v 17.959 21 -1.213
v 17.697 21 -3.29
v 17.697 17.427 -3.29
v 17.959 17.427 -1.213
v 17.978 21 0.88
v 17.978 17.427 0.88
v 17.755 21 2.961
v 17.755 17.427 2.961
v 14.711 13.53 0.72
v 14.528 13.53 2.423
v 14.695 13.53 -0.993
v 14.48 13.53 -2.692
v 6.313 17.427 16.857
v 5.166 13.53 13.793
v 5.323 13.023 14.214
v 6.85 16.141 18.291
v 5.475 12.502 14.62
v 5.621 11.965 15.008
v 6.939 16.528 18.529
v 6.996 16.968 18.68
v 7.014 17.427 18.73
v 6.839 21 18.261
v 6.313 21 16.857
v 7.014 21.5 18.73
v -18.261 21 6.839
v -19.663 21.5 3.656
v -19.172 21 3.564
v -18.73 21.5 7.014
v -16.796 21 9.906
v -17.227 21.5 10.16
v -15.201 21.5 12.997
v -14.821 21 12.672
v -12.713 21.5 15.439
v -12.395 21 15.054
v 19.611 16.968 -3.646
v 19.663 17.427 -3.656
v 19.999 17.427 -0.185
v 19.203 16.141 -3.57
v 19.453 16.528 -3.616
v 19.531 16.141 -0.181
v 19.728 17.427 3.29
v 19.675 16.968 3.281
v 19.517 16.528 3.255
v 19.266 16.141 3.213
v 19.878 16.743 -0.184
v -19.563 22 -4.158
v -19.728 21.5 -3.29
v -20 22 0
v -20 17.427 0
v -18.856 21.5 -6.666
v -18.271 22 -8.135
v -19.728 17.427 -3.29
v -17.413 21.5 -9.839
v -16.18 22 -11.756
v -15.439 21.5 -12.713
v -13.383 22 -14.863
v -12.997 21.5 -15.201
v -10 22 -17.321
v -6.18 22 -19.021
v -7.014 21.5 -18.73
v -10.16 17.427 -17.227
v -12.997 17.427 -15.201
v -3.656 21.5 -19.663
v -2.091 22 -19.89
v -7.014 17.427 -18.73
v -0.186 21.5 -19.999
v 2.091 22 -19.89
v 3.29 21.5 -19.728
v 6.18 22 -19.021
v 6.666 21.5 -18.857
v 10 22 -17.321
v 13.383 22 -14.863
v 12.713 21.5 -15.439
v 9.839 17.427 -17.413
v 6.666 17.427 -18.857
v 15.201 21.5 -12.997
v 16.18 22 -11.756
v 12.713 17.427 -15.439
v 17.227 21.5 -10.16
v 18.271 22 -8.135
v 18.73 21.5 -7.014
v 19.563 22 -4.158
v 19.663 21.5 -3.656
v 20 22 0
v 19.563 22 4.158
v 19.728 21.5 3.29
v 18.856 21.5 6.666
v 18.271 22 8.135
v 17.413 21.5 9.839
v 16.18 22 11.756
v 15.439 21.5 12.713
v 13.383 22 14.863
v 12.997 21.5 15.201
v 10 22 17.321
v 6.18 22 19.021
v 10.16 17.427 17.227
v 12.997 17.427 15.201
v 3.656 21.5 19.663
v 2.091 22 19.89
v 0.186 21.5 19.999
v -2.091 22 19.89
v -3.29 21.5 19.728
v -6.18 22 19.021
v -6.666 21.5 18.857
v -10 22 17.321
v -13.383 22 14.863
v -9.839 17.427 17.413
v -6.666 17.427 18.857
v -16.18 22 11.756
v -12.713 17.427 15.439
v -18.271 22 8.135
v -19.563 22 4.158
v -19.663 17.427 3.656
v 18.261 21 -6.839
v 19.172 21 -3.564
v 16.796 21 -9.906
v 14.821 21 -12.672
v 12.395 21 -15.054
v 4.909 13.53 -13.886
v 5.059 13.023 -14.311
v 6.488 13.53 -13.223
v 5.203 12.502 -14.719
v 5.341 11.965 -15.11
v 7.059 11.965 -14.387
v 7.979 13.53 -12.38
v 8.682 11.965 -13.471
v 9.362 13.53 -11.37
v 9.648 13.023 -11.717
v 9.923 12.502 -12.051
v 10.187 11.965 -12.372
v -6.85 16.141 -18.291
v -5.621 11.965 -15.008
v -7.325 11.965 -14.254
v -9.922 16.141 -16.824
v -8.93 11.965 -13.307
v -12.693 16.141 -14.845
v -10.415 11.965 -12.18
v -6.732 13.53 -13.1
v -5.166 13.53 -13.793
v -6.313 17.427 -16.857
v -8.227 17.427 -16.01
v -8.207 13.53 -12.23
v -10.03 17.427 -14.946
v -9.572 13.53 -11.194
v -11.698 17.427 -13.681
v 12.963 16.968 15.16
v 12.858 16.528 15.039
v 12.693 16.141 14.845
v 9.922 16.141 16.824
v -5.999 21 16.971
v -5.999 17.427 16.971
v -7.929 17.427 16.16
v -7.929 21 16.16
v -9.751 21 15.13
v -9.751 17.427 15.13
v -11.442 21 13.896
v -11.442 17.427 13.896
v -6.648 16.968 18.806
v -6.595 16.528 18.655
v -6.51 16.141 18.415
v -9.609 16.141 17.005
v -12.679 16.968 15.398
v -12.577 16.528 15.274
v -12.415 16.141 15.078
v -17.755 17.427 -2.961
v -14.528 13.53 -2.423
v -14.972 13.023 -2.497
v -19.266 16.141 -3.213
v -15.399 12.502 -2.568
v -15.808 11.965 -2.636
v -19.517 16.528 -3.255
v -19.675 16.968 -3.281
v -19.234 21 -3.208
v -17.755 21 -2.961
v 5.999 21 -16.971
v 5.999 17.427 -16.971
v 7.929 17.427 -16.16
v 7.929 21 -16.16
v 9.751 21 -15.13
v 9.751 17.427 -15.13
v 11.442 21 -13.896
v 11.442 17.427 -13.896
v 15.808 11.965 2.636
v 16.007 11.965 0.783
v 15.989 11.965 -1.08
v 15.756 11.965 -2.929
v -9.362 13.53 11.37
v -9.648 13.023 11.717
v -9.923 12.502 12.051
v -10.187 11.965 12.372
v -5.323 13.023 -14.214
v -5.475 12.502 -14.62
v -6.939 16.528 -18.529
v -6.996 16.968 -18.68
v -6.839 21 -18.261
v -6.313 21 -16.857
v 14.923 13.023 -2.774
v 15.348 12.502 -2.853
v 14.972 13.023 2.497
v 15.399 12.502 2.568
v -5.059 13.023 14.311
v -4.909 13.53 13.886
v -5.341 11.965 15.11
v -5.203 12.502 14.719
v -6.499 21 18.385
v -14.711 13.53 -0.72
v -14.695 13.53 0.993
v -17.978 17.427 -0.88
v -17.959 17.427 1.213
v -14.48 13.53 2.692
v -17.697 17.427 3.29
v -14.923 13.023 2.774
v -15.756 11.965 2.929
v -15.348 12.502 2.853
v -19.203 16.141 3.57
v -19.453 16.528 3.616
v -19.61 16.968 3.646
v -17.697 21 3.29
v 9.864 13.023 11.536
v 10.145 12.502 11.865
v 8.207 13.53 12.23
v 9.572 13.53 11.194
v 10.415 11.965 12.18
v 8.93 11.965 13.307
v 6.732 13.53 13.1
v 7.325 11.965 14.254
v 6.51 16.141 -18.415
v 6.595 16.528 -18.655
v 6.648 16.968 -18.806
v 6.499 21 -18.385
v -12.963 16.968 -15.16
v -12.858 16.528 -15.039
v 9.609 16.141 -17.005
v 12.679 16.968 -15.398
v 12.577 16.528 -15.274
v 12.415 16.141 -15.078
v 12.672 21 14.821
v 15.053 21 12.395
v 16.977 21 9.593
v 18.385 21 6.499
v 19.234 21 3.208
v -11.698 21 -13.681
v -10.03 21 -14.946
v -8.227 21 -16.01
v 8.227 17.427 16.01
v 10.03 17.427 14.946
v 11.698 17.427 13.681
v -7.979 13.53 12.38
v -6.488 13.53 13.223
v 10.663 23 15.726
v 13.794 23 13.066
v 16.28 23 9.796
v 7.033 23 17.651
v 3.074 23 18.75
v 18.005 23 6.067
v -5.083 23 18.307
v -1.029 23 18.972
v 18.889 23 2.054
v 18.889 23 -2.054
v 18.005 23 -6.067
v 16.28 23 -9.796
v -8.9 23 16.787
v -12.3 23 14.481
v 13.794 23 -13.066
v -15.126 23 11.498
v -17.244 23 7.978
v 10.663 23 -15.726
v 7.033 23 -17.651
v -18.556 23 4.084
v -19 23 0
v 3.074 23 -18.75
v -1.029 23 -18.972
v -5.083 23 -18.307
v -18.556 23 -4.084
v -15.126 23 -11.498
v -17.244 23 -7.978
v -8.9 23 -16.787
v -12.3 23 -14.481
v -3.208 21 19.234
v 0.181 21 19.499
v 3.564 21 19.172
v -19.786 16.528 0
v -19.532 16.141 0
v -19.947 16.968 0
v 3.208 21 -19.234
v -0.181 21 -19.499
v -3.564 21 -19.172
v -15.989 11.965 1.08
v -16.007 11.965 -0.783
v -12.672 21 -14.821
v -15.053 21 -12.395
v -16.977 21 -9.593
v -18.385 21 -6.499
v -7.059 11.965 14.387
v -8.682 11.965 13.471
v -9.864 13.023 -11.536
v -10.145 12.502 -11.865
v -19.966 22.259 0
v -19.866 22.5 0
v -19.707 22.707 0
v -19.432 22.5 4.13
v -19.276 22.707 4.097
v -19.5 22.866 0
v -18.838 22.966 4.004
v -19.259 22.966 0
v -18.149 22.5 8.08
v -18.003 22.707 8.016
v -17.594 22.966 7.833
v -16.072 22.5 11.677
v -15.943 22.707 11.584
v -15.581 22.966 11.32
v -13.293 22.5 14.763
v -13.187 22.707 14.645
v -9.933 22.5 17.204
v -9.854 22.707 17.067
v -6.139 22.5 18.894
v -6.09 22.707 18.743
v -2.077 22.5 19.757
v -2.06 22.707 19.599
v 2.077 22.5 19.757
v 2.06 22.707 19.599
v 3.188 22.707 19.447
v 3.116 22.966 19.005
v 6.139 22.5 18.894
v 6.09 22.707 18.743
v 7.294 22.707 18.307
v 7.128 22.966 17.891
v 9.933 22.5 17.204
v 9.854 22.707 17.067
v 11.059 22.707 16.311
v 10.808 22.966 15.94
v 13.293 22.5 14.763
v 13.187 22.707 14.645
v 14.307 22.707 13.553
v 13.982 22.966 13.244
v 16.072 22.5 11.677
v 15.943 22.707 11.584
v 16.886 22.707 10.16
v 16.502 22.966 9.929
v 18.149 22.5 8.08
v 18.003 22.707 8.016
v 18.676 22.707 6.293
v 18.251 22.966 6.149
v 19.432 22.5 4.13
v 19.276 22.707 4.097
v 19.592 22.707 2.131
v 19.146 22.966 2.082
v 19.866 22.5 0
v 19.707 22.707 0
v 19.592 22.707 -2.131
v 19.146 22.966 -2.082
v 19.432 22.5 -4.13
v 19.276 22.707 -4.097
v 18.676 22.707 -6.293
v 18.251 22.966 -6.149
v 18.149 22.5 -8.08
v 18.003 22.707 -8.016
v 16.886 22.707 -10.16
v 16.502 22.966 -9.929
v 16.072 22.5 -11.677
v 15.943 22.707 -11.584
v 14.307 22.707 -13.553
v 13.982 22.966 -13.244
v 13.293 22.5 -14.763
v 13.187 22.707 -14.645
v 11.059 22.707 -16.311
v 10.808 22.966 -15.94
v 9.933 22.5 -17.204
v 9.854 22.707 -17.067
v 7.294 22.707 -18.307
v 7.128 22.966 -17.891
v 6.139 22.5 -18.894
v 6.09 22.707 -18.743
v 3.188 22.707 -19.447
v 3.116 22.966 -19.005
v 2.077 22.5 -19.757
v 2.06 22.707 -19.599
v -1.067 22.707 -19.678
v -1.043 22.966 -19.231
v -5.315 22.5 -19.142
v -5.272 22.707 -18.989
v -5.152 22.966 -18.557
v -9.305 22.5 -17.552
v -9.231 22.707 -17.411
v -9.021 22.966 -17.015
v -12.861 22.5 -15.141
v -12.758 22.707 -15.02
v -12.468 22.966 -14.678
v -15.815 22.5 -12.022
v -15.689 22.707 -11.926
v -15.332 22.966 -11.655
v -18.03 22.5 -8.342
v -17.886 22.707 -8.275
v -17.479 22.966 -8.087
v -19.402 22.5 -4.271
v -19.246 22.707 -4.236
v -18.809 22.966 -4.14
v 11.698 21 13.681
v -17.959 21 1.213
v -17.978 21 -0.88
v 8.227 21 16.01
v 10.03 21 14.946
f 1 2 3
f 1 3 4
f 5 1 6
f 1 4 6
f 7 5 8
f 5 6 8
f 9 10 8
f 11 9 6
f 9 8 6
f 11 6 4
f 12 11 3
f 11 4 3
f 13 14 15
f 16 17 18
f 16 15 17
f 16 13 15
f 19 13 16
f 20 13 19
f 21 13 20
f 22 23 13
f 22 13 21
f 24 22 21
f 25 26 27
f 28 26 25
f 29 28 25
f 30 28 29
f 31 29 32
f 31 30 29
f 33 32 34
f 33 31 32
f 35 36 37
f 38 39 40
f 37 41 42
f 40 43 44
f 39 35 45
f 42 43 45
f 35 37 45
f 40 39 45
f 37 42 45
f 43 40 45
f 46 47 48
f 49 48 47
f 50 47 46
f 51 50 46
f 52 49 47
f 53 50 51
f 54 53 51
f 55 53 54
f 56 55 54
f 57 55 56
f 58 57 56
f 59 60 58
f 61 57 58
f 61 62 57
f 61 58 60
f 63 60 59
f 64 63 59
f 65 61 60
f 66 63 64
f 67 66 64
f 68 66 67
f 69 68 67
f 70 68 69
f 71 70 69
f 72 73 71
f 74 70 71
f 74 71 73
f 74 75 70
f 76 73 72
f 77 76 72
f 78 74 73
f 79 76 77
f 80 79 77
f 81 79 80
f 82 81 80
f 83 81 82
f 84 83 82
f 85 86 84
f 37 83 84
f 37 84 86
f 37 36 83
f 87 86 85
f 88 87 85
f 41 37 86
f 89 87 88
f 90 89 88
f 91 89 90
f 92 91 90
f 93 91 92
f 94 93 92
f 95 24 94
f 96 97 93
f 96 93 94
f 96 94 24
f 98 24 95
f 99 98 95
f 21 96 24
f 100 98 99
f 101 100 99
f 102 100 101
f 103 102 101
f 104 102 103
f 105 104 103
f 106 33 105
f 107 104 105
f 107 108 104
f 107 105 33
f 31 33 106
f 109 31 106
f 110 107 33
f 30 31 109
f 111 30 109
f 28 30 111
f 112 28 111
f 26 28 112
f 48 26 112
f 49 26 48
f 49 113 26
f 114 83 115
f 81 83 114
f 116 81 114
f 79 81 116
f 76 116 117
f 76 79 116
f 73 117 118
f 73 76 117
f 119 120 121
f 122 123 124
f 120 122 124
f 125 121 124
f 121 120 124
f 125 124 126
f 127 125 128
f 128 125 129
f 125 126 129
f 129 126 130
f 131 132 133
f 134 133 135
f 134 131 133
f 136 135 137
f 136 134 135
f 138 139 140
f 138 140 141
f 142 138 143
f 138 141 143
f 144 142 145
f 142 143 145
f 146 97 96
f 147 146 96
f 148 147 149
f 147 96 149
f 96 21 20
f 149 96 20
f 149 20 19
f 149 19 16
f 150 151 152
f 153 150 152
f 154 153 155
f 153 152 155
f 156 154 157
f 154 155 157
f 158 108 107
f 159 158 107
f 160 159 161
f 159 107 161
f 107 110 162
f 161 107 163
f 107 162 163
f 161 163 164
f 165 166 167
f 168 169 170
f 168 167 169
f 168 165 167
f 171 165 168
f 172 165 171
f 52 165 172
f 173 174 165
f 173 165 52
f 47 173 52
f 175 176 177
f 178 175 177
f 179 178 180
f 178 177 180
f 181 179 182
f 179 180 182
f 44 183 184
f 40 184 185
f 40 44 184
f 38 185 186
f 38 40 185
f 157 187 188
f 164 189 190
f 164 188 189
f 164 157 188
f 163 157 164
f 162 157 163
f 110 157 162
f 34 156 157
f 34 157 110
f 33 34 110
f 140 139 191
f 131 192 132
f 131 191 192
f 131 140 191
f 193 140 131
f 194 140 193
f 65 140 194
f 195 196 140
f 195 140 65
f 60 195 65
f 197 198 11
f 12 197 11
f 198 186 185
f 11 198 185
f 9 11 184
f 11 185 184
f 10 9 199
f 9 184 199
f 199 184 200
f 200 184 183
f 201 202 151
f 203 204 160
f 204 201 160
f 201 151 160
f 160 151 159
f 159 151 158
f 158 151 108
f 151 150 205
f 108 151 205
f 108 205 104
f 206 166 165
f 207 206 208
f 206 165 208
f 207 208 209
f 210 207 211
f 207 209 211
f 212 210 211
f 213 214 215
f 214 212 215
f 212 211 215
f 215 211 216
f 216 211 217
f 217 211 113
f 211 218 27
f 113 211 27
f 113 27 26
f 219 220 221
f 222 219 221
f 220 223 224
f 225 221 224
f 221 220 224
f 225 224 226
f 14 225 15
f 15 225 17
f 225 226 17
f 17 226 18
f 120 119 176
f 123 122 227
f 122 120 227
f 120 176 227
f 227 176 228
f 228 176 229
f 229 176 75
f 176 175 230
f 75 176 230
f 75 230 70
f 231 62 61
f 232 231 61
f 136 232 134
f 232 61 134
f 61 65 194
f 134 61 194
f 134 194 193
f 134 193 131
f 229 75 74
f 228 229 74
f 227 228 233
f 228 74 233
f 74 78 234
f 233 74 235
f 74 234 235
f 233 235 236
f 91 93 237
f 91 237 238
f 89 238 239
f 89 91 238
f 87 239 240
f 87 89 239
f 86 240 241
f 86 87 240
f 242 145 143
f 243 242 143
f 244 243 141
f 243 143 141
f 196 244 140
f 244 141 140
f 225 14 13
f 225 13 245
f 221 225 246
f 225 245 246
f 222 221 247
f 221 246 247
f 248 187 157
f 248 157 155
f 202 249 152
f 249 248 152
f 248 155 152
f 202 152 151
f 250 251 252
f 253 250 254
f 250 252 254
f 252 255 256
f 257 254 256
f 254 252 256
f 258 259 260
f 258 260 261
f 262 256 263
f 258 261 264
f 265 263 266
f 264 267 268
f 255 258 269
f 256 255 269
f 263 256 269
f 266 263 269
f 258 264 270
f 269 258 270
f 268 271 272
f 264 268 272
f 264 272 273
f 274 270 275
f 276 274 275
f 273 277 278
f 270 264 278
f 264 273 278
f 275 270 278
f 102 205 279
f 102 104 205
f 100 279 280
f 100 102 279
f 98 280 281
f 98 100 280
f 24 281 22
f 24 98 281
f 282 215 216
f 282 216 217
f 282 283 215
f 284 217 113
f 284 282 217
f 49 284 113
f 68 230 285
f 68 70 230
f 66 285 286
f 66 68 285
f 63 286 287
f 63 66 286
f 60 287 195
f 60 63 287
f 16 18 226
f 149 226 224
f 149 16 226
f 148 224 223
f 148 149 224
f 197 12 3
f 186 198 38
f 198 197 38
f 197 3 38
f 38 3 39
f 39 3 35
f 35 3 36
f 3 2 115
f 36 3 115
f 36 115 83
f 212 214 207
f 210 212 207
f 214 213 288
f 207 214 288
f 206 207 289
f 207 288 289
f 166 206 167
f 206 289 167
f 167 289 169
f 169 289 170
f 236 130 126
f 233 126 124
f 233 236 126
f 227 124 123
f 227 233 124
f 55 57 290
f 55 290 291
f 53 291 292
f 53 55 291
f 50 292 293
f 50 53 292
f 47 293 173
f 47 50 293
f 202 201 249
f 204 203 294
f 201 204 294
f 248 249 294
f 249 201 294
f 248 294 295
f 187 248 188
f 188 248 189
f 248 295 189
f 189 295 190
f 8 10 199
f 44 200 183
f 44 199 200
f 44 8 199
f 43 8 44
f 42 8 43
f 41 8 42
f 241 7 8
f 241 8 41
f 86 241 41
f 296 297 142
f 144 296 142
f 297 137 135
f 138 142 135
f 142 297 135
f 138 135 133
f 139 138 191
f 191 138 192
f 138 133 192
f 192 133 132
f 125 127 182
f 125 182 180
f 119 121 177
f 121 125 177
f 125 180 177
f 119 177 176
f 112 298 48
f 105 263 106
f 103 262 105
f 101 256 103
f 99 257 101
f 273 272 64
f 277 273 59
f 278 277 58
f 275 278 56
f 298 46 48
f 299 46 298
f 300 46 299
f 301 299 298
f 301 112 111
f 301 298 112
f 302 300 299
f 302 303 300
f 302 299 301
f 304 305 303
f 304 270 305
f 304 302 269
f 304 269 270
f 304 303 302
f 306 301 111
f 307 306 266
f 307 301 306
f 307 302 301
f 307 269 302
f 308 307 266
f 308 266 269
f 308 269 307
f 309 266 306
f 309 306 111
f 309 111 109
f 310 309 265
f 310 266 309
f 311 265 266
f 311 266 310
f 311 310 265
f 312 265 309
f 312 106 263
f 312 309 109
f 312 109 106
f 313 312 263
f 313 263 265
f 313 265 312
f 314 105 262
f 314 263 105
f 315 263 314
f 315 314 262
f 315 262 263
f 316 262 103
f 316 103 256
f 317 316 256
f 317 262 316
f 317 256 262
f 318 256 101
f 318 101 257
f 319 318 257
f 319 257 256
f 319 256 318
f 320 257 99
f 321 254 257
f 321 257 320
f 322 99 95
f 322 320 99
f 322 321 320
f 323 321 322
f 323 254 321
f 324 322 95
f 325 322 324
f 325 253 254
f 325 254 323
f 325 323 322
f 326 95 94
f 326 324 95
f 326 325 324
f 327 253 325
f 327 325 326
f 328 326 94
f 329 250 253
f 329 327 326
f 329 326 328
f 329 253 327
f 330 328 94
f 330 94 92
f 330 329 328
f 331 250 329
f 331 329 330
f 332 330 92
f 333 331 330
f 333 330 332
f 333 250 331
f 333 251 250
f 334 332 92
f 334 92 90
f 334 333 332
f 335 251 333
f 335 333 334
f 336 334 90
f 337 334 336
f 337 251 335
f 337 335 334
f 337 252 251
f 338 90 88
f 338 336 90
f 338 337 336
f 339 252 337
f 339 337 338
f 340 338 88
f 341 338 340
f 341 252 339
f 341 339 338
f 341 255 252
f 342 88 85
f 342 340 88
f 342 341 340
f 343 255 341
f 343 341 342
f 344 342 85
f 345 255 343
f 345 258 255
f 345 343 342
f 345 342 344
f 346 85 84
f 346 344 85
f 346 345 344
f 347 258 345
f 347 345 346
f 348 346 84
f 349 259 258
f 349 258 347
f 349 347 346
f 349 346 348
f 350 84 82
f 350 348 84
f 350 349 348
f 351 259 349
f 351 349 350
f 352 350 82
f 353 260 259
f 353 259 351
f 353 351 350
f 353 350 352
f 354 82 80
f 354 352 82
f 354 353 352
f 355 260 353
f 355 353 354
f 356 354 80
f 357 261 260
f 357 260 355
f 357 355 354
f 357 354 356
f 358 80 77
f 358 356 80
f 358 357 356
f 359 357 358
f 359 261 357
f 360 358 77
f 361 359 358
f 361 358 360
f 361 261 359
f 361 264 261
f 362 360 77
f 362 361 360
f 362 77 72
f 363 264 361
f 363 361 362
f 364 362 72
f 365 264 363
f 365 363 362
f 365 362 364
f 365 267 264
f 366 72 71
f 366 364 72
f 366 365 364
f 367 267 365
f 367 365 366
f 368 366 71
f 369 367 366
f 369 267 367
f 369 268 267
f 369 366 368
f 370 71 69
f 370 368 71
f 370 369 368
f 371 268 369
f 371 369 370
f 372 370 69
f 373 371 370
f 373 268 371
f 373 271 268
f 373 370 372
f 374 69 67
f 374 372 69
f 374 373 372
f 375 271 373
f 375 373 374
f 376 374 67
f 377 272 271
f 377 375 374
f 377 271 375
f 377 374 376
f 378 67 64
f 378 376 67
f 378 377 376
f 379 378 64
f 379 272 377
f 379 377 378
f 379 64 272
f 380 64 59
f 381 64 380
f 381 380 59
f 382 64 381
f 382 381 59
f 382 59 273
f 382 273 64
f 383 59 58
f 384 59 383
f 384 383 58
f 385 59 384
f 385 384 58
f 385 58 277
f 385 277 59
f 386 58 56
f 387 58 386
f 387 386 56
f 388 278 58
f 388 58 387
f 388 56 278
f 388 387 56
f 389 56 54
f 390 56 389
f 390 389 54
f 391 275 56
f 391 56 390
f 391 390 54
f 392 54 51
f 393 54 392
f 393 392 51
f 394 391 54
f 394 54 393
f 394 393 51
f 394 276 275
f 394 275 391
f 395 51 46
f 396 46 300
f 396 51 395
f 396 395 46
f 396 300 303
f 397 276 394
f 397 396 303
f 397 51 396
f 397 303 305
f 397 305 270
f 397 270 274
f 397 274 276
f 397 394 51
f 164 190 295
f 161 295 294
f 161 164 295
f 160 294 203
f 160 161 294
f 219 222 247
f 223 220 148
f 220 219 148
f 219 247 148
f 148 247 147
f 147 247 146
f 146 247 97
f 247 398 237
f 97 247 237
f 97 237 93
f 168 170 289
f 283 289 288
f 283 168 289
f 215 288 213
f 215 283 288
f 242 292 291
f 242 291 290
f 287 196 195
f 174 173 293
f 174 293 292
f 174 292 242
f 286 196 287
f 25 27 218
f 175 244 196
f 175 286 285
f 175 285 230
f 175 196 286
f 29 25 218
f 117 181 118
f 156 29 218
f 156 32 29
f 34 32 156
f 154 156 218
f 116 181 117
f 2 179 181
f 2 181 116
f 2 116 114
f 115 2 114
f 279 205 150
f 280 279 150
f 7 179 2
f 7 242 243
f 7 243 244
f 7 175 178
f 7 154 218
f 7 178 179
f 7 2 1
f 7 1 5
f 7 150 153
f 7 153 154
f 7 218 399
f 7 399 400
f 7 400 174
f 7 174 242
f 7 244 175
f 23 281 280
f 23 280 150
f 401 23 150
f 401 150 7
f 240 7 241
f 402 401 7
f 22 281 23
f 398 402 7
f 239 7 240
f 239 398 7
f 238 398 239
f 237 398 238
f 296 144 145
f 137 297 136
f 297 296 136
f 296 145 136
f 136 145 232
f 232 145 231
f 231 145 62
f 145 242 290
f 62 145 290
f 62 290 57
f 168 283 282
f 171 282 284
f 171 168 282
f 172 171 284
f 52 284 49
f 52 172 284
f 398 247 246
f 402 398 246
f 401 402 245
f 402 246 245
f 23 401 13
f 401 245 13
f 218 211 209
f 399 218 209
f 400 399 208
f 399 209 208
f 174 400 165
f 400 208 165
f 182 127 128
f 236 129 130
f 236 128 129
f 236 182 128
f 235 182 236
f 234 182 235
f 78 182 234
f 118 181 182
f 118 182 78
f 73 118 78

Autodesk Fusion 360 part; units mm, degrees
sketch "Skizze1" plane through (0, 0, 0) normal (0, 0, 1) x (1, 0, 0)
  circle A0 centre (0, 0) radius 20
  line L0 (0, 50) -> (0, -36.4171) construction
  line L1 (-20, 23) -> (20, 23)
  line L2 (20, 23) -> (20, 16.6992)
  line L3 (20, 16.6992) -> (16.0259, 11.9654)
  line L4 (-20, 23) -> (-20, 16.6992)
  line L5 (-20, 16.6992) -> (-16.0259, 11.9654)
  line L6 (-16.0259, 11.9654) -> (16.0259, 11.9654) construction
  line L7 (-18, 21) -> (18, 21)
  line L8 (18, 21) -> (18, 17.4274)
  line L9 (18, 17.4274) -> (14.7285, 13.5304)
  line L10 (-18, 21) -> (-18, 17.4274)
  line L11 (-18, 17.4274) -> (-14.7285, 13.5304)
  line L12 (0, 23) -> (0, 21)
  point P0 (0, 20)
  dimension "d1" = 40
  dimension "d2" = 40
  dimension "d3" = 3
  dimension "d4" = 2
  dimension "d5" = 2
  dimension "d6" = 2
  dimension "d7" = 2
  dimension "d8" = 2
revolve "Drehen1" add sketch "Skizze1" angle 360 about axis through (0, 50, 0) along (0, -1, 0) contours A0 L1 L4 L5 L7 L10 L11 L12
sketch "Skizze2" plane through (0, 21, 0) normal (0, -1, 0) x (1, 0, 0)
  circle A0 centre (0, 0) radius 18
  circle A1 centre (0, 0) radius 20.5
  line L0 (0, 0) -> (7.1898, 19.1978)
  line L1 (0, 0) -> (13.3222, 15.581)
  line L2 (0, 0) -> (17.8478, 10.0849)
  line L3 (0, 0) -> (20.2207, 3.3724)
  line L4 (0, 0) -> (20.1547, -3.7469)
  line L5 (0, 0) -> (0.1901, 20.4991)
  line L6 (0, 0) -> (-6.8324, 19.3279)
  line L7 (0, 0) -> (-13.0309, 15.8255)
  line L8 (0, 0) -> (-17.6577, 10.4142)
  line L9 (0, 0) -> (-20.1547, 3.7469)
  line L10 (0, 0) -> (-20.2207, -3.3724)
  line L11 (0, 0) -> (-17.8478, -10.0849)
  line L12 (0, 0) -> (-13.3222, -15.581)
  line L13 (0, 0) -> (17.6577, -10.4142)
  line L14 (0, 0) -> (13.0309, -15.8255)
  line L15 (0, 0) -> (6.8324, -19.3279)
  line L16 (0, 0) -> (-7.1898, -19.1978)
  line L17 (0, 0) -> (-0.1901, -20.4991)
  dimension "d10" = 41
  dimension "d12" = 20
  dimension "d13" = 20
  dimension "d14" = 20
  dimension "d15" = 20
  dimension "d16" = 20
  dimension "d17" = 20
  dimension "d18" = 20
  dimension "d19" = 20
  dimension "d20" = 20
  dimension "d21" = 20
  dimension "d22" = 20
  dimension "d23" = 20
  dimension "d24" = 20
  dimension "d25" = 20
  dimension "d26" = 20
  dimension "d27" = 20
  dimension "d28" = 20
extrude "Extrusion1" cut sketch "Skizze2" along normal blind 20 contours A0 L2 L3 | A0 A1 L2 L3 | A0 A1 L4 L13 | A0 L4 L13 | A0 L1 L2 | A0 A1 L1 L2 | A0 L0 L5 | A0 L5 L6 | A0 L7 L8 | A0 L8 L9 | A0 L10 L11 | A0 L11 L12 | A0 L13 L14 | A0 L16 L17 | A0 L15 L17 | A0 A1 L13 L14 | A0 A1 L0 L5 | A0 A1 L5 L6 | A0 A1 L7 L8 | A0 A1 L8 L9 | A0 A1 L10 L11 | A0 A1 L11 L12 | A0 A1 L15 L17 | A0 A1 L16 L17
fillet "Abrundung1" radius 2 6 edges at (-10.1602, 16.6992, -17.227) (9.8389, 16.6992, -17.4125) (19.9991, 16.6992, -0.1855) (-19.9991, 16.6992, 0.1855) (-9.8389, 16.6992, 17.4125) (10.1602, 16.6992, 17.227)
chamfer "Fase1" distance 0.5 angle 45 6 edges at (17.227, 21, -10.1602) (-0.1855, 21, -19.9991) (17.4125, 21, 9.8389) (0.1855, 21, 19.9991) (-17.227, 21, 10.1602) (-17.4125, 21, -9.8389)
fillet "Abrundung2" radius 1 1 edges at (-18.6465, 23, 7.2323)
